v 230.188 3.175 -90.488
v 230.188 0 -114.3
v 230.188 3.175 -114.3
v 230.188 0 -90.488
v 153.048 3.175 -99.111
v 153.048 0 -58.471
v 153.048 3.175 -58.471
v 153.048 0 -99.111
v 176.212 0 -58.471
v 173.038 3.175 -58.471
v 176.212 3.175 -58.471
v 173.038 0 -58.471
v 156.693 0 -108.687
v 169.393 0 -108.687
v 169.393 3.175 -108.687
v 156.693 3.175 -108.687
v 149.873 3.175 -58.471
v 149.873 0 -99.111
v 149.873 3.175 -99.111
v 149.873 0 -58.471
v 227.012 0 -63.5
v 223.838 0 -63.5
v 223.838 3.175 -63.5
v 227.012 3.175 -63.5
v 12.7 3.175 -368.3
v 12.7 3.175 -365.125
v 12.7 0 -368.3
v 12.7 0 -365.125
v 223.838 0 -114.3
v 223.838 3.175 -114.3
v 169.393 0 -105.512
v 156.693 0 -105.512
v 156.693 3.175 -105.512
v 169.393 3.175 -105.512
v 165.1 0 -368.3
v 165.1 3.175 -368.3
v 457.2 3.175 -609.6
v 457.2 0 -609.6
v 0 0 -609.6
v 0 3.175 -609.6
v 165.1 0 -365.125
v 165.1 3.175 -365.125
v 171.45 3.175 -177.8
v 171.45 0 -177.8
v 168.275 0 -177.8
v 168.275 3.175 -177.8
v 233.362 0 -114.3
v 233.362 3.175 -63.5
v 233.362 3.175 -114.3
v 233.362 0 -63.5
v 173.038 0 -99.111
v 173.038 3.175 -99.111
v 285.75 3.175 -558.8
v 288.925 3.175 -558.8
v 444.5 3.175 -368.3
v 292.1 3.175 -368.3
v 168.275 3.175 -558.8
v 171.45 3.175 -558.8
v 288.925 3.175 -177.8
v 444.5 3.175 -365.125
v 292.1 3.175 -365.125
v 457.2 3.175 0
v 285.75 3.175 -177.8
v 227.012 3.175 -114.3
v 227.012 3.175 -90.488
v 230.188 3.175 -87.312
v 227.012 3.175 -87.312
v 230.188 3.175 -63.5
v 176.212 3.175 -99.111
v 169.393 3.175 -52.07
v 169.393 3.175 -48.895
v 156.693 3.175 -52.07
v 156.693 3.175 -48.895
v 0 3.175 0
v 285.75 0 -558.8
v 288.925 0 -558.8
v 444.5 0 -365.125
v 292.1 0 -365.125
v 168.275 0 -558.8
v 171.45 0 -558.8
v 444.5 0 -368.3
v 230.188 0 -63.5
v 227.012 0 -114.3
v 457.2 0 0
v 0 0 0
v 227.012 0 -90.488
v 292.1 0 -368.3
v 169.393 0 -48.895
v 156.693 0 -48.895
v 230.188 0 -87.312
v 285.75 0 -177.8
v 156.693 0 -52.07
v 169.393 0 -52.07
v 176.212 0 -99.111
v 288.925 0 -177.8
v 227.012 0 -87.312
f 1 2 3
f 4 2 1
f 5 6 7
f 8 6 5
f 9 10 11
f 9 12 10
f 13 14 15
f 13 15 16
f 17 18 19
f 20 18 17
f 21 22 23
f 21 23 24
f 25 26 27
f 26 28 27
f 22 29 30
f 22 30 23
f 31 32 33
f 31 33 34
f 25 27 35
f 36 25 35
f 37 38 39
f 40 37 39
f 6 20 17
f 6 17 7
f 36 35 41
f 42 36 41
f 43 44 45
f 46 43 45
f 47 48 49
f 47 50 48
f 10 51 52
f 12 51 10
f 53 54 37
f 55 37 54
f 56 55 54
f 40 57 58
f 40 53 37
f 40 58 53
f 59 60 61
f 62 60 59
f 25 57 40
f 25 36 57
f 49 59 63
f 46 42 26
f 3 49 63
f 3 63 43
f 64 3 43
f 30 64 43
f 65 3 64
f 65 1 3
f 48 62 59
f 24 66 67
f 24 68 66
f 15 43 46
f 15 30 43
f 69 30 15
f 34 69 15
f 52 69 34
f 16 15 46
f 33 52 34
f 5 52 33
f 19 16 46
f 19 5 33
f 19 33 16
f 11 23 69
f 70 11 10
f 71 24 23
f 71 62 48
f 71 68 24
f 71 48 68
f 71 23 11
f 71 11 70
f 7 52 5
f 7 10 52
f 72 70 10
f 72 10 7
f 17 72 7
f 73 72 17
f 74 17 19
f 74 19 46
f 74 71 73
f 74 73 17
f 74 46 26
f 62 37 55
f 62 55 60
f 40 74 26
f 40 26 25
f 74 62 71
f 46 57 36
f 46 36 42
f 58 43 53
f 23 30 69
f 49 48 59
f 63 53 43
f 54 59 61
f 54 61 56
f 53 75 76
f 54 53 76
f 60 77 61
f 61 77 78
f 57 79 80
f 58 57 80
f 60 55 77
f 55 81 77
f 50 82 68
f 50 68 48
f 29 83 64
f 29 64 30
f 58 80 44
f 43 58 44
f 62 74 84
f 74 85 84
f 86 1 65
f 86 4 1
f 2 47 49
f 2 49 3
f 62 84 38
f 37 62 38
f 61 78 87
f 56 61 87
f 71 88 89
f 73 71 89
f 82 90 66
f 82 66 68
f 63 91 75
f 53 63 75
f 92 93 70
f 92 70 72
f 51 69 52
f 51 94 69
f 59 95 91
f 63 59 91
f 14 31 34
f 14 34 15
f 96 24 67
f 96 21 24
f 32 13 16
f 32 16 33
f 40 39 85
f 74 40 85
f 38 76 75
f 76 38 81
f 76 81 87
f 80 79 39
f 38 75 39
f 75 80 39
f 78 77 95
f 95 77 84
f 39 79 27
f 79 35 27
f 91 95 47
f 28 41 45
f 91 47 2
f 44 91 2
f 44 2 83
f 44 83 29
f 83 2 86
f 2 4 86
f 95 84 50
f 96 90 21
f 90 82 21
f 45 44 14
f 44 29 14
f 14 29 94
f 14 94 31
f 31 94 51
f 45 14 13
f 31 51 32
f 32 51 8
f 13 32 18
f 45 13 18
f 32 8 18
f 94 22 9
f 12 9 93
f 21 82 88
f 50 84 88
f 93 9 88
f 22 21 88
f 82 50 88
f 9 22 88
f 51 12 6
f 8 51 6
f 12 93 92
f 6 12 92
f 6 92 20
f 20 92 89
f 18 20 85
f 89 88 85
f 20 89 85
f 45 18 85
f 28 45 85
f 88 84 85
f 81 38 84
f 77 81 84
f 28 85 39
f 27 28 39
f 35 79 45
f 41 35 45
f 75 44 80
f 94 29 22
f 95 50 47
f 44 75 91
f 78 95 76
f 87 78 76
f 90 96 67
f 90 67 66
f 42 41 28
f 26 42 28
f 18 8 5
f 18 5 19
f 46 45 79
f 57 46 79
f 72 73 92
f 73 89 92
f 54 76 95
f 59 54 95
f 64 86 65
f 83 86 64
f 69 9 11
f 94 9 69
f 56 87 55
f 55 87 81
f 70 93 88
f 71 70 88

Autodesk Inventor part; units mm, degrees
ref_plane "YZ Plane" through (0, 0, 0) normal (1, 0, 0) x (0, 1, 0)
ref_plane "XZ Plane" through (0, 0, 0) normal (0, 1, 0) x (-1, 0, 0)
ref_plane "XY Plane" through (0, 0, 0) normal (0, 0, 1) x (1, 0, 0)
sketch "Sketch1" plane through (0, 0, 0) normal (0, 1, 0) x (-1, 0, 0)
  line L0 (0, 0) -> (-457.2, 0)
  line L1 (-457.2, 0) -> (-457.2, -609.6)
  line L2 (-457.2, -609.6) -> (0, -609.6)
  line L3 (0, -609.6) -> (0, 0)
  line L4 (-168.275, -558.8) -> (-171.45, -558.8)
  line L5 (-171.45, -558.8) -> (-171.45, -177.8)
  line L6 (-171.45, -177.8) -> (-168.275, -177.8)
  line L7 (-168.275, -177.8) -> (-168.275, -558.8)
  line L8 (-285.75, -558.8) -> (-288.925, -558.8)
  line L9 (-288.925, -558.8) -> (-288.925, -177.8)
  line L10 (-288.925, -177.8) -> (-285.75, -177.8)
  line L11 (-285.75, -177.8) -> (-285.75, -558.8)
  line L12 (-12.7, -368.3) -> (-165.1, -368.3)
  line L13 (-165.1, -368.3) -> (-165.1, -365.125)
  line L14 (-165.1, -365.125) -> (-12.7, -365.125)
  line L15 (-12.7, -365.125) -> (-12.7, -368.3)
  line L16 (-292.1, -368.3) -> (-444.5, -368.3)
  line L17 (-444.5, -368.3) -> (-444.5, -365.125)
  line L18 (-444.5, -365.125) -> (-292.1, -365.125)
  line L19 (-292.1, -365.125) -> (-292.1, -368.3)
  line L20 (-223.8375, -63.5) -> (-227.0125, -63.5)
  line L21 (-227.0125, -63.5) -> (-227.0125, -114.3)
  line L22 (-227.0125, -114.3) -> (-223.8375, -114.3)
  line L23 (-223.8375, -114.3) -> (-223.8375, -63.5)
  line L24 (-230.1875, -63.5) -> (-233.3625, -63.5)
  line L25 (-233.3625, -63.5) -> (-233.3625, -114.3)
  line L26 (-233.3625, -114.3) -> (-230.1875, -114.3)
  line L27 (-230.1875, -114.3) -> (-230.1875, -63.5)
  line L28 (-153.0477, -105.5116) -> (-173.0375, -105.5116)
  line L29 (-173.0375, -105.5116) -> (-173.0375, -52.07)
  line L30 (-173.0375, -52.07) -> (-153.0477, -52.07)
  line L31 (-153.0477, -52.07) -> (-153.0477, -105.5116)
  line L32 (-156.6926, -105.5116) -> (-169.3926, -105.5116)
  line L33 (-169.3926, -105.5116) -> (-169.3926, -108.6866)
  line L34 (-169.3926, -108.6866) -> (-156.6926, -108.6866)
  line L35 (-156.6926, -108.6866) -> (-156.6926, -105.5116)
  line L36 (-156.6926, -52.07) -> (-169.3926, -52.07)
  line L37 (-169.3926, -52.07) -> (-169.3926, -48.895)
  line L38 (-169.3926, -48.895) -> (-156.6926, -48.895)
  line L39 (-156.6926, -48.895) -> (-156.6926, -52.07)
  line L40 (-153.0477, -99.1108) -> (-149.8727, -99.1108)
  line L41 (-149.8727, -99.1108) -> (-149.8727, -58.4708)
  line L42 (-149.8727, -58.4708) -> (-153.0477, -58.4708)
  line L43 (-153.0477, -58.4708) -> (-153.0477, -99.1108)
  line L44 (-173.0375, -58.4708) -> (-176.2125, -58.4708)
  line L45 (-176.2125, -58.4708) -> (-176.2125, -99.1108)
  line L46 (-176.2125, -99.1108) -> (-173.0375, -99.1108)
  line L47 (-173.0375, -99.1108) -> (-173.0375, -58.4708)
  line L48 (-227.0125, -87.3125) -> (-230.1875, -87.3125)
  line L49 (-230.1875, -87.3125) -> (-230.1875, -90.4875)
  line L50 (-230.1875, -90.4875) -> (-227.0125, -90.4875)
  line L51 (-227.0125, -90.4875) -> (-227.0125, -87.3125)
  point P0 (-169.8625, -558.8)
  point P1 (-169.8625, -177.8)
  point P2 (-287.3375, -558.8)
  point P3 (-287.3375, -177.8)
  point P4 (-168.275, -368.3)
  point P5 (-165.1, -366.7125)
  point P6 (-292.1, -366.7125)
  point P7 (-225.425, -63.5)
  point P8 (-163.0426, -105.5116)
  point P9 (-156.6926, -107.0991)
  point P10 (-156.6926, -50.4825)
  point P11 (-151.4602, -99.1108)
  point P12 (-169.3926, -105.5116)
  dimension "d0" = 457.2
  dimension "d1" = 609.6
  dimension "d2" = 3.175
  dimension "d3" = 3.175
  dimension "d4" = 381
  dimension "d5" = 381
  dimension "d6" = 50.8
  dimension "d7" = 50.8
  dimension "d8" = 114.3
  dimension "d9" = 168.275
  dimension "d10" = 152.4
  dimension "d11" = 3.175
  dimension "d12" = 241.3
  dimension "d13" = 3.175
  dimension "d14" = 152.4
  dimension "d15" = 3.175
  dimension "d16" = 3.175
  dimension "d17" = 241.3
  dimension "d18" = 3.175
  dimension "d19" = 50.8
  dimension "d20" = 3.175
  dimension "d21" = 50.8
  dimension "d22" = 3.175
  dimension "d23" = 223.8375
  dimension "d24" = 19.9898
  dimension "d25" = 53.4416
  dimension "d26" = 50.8
  dimension "d27" = 63.5
  dimension "d29" = 105.5116
  dimension "d30" = 12.7
  dimension "d31" = 3.175
  dimension "d32" = 3.6449
  dimension "d33" = 12.7
  dimension "d34" = 3.175
  dimension "d35" = 3.6449
  dimension "d36" = 3.175
  dimension "d37" = 40.64
  dimension "d38" = 6.4008
  dimension "d39" = 3.175
  dimension "d40" = 40.64
  dimension "d41" = 6.4008
  dimension "d44" = 3.175
  dimension "d45" = 3.175
  dimension "d46" = 23.8125
extrude "Extrusion1" add sketch "Sketch1" along normal blind 3.175 contours L3 L2 L1 L0 | L28 L29 L30 L31
properties part number "base"
